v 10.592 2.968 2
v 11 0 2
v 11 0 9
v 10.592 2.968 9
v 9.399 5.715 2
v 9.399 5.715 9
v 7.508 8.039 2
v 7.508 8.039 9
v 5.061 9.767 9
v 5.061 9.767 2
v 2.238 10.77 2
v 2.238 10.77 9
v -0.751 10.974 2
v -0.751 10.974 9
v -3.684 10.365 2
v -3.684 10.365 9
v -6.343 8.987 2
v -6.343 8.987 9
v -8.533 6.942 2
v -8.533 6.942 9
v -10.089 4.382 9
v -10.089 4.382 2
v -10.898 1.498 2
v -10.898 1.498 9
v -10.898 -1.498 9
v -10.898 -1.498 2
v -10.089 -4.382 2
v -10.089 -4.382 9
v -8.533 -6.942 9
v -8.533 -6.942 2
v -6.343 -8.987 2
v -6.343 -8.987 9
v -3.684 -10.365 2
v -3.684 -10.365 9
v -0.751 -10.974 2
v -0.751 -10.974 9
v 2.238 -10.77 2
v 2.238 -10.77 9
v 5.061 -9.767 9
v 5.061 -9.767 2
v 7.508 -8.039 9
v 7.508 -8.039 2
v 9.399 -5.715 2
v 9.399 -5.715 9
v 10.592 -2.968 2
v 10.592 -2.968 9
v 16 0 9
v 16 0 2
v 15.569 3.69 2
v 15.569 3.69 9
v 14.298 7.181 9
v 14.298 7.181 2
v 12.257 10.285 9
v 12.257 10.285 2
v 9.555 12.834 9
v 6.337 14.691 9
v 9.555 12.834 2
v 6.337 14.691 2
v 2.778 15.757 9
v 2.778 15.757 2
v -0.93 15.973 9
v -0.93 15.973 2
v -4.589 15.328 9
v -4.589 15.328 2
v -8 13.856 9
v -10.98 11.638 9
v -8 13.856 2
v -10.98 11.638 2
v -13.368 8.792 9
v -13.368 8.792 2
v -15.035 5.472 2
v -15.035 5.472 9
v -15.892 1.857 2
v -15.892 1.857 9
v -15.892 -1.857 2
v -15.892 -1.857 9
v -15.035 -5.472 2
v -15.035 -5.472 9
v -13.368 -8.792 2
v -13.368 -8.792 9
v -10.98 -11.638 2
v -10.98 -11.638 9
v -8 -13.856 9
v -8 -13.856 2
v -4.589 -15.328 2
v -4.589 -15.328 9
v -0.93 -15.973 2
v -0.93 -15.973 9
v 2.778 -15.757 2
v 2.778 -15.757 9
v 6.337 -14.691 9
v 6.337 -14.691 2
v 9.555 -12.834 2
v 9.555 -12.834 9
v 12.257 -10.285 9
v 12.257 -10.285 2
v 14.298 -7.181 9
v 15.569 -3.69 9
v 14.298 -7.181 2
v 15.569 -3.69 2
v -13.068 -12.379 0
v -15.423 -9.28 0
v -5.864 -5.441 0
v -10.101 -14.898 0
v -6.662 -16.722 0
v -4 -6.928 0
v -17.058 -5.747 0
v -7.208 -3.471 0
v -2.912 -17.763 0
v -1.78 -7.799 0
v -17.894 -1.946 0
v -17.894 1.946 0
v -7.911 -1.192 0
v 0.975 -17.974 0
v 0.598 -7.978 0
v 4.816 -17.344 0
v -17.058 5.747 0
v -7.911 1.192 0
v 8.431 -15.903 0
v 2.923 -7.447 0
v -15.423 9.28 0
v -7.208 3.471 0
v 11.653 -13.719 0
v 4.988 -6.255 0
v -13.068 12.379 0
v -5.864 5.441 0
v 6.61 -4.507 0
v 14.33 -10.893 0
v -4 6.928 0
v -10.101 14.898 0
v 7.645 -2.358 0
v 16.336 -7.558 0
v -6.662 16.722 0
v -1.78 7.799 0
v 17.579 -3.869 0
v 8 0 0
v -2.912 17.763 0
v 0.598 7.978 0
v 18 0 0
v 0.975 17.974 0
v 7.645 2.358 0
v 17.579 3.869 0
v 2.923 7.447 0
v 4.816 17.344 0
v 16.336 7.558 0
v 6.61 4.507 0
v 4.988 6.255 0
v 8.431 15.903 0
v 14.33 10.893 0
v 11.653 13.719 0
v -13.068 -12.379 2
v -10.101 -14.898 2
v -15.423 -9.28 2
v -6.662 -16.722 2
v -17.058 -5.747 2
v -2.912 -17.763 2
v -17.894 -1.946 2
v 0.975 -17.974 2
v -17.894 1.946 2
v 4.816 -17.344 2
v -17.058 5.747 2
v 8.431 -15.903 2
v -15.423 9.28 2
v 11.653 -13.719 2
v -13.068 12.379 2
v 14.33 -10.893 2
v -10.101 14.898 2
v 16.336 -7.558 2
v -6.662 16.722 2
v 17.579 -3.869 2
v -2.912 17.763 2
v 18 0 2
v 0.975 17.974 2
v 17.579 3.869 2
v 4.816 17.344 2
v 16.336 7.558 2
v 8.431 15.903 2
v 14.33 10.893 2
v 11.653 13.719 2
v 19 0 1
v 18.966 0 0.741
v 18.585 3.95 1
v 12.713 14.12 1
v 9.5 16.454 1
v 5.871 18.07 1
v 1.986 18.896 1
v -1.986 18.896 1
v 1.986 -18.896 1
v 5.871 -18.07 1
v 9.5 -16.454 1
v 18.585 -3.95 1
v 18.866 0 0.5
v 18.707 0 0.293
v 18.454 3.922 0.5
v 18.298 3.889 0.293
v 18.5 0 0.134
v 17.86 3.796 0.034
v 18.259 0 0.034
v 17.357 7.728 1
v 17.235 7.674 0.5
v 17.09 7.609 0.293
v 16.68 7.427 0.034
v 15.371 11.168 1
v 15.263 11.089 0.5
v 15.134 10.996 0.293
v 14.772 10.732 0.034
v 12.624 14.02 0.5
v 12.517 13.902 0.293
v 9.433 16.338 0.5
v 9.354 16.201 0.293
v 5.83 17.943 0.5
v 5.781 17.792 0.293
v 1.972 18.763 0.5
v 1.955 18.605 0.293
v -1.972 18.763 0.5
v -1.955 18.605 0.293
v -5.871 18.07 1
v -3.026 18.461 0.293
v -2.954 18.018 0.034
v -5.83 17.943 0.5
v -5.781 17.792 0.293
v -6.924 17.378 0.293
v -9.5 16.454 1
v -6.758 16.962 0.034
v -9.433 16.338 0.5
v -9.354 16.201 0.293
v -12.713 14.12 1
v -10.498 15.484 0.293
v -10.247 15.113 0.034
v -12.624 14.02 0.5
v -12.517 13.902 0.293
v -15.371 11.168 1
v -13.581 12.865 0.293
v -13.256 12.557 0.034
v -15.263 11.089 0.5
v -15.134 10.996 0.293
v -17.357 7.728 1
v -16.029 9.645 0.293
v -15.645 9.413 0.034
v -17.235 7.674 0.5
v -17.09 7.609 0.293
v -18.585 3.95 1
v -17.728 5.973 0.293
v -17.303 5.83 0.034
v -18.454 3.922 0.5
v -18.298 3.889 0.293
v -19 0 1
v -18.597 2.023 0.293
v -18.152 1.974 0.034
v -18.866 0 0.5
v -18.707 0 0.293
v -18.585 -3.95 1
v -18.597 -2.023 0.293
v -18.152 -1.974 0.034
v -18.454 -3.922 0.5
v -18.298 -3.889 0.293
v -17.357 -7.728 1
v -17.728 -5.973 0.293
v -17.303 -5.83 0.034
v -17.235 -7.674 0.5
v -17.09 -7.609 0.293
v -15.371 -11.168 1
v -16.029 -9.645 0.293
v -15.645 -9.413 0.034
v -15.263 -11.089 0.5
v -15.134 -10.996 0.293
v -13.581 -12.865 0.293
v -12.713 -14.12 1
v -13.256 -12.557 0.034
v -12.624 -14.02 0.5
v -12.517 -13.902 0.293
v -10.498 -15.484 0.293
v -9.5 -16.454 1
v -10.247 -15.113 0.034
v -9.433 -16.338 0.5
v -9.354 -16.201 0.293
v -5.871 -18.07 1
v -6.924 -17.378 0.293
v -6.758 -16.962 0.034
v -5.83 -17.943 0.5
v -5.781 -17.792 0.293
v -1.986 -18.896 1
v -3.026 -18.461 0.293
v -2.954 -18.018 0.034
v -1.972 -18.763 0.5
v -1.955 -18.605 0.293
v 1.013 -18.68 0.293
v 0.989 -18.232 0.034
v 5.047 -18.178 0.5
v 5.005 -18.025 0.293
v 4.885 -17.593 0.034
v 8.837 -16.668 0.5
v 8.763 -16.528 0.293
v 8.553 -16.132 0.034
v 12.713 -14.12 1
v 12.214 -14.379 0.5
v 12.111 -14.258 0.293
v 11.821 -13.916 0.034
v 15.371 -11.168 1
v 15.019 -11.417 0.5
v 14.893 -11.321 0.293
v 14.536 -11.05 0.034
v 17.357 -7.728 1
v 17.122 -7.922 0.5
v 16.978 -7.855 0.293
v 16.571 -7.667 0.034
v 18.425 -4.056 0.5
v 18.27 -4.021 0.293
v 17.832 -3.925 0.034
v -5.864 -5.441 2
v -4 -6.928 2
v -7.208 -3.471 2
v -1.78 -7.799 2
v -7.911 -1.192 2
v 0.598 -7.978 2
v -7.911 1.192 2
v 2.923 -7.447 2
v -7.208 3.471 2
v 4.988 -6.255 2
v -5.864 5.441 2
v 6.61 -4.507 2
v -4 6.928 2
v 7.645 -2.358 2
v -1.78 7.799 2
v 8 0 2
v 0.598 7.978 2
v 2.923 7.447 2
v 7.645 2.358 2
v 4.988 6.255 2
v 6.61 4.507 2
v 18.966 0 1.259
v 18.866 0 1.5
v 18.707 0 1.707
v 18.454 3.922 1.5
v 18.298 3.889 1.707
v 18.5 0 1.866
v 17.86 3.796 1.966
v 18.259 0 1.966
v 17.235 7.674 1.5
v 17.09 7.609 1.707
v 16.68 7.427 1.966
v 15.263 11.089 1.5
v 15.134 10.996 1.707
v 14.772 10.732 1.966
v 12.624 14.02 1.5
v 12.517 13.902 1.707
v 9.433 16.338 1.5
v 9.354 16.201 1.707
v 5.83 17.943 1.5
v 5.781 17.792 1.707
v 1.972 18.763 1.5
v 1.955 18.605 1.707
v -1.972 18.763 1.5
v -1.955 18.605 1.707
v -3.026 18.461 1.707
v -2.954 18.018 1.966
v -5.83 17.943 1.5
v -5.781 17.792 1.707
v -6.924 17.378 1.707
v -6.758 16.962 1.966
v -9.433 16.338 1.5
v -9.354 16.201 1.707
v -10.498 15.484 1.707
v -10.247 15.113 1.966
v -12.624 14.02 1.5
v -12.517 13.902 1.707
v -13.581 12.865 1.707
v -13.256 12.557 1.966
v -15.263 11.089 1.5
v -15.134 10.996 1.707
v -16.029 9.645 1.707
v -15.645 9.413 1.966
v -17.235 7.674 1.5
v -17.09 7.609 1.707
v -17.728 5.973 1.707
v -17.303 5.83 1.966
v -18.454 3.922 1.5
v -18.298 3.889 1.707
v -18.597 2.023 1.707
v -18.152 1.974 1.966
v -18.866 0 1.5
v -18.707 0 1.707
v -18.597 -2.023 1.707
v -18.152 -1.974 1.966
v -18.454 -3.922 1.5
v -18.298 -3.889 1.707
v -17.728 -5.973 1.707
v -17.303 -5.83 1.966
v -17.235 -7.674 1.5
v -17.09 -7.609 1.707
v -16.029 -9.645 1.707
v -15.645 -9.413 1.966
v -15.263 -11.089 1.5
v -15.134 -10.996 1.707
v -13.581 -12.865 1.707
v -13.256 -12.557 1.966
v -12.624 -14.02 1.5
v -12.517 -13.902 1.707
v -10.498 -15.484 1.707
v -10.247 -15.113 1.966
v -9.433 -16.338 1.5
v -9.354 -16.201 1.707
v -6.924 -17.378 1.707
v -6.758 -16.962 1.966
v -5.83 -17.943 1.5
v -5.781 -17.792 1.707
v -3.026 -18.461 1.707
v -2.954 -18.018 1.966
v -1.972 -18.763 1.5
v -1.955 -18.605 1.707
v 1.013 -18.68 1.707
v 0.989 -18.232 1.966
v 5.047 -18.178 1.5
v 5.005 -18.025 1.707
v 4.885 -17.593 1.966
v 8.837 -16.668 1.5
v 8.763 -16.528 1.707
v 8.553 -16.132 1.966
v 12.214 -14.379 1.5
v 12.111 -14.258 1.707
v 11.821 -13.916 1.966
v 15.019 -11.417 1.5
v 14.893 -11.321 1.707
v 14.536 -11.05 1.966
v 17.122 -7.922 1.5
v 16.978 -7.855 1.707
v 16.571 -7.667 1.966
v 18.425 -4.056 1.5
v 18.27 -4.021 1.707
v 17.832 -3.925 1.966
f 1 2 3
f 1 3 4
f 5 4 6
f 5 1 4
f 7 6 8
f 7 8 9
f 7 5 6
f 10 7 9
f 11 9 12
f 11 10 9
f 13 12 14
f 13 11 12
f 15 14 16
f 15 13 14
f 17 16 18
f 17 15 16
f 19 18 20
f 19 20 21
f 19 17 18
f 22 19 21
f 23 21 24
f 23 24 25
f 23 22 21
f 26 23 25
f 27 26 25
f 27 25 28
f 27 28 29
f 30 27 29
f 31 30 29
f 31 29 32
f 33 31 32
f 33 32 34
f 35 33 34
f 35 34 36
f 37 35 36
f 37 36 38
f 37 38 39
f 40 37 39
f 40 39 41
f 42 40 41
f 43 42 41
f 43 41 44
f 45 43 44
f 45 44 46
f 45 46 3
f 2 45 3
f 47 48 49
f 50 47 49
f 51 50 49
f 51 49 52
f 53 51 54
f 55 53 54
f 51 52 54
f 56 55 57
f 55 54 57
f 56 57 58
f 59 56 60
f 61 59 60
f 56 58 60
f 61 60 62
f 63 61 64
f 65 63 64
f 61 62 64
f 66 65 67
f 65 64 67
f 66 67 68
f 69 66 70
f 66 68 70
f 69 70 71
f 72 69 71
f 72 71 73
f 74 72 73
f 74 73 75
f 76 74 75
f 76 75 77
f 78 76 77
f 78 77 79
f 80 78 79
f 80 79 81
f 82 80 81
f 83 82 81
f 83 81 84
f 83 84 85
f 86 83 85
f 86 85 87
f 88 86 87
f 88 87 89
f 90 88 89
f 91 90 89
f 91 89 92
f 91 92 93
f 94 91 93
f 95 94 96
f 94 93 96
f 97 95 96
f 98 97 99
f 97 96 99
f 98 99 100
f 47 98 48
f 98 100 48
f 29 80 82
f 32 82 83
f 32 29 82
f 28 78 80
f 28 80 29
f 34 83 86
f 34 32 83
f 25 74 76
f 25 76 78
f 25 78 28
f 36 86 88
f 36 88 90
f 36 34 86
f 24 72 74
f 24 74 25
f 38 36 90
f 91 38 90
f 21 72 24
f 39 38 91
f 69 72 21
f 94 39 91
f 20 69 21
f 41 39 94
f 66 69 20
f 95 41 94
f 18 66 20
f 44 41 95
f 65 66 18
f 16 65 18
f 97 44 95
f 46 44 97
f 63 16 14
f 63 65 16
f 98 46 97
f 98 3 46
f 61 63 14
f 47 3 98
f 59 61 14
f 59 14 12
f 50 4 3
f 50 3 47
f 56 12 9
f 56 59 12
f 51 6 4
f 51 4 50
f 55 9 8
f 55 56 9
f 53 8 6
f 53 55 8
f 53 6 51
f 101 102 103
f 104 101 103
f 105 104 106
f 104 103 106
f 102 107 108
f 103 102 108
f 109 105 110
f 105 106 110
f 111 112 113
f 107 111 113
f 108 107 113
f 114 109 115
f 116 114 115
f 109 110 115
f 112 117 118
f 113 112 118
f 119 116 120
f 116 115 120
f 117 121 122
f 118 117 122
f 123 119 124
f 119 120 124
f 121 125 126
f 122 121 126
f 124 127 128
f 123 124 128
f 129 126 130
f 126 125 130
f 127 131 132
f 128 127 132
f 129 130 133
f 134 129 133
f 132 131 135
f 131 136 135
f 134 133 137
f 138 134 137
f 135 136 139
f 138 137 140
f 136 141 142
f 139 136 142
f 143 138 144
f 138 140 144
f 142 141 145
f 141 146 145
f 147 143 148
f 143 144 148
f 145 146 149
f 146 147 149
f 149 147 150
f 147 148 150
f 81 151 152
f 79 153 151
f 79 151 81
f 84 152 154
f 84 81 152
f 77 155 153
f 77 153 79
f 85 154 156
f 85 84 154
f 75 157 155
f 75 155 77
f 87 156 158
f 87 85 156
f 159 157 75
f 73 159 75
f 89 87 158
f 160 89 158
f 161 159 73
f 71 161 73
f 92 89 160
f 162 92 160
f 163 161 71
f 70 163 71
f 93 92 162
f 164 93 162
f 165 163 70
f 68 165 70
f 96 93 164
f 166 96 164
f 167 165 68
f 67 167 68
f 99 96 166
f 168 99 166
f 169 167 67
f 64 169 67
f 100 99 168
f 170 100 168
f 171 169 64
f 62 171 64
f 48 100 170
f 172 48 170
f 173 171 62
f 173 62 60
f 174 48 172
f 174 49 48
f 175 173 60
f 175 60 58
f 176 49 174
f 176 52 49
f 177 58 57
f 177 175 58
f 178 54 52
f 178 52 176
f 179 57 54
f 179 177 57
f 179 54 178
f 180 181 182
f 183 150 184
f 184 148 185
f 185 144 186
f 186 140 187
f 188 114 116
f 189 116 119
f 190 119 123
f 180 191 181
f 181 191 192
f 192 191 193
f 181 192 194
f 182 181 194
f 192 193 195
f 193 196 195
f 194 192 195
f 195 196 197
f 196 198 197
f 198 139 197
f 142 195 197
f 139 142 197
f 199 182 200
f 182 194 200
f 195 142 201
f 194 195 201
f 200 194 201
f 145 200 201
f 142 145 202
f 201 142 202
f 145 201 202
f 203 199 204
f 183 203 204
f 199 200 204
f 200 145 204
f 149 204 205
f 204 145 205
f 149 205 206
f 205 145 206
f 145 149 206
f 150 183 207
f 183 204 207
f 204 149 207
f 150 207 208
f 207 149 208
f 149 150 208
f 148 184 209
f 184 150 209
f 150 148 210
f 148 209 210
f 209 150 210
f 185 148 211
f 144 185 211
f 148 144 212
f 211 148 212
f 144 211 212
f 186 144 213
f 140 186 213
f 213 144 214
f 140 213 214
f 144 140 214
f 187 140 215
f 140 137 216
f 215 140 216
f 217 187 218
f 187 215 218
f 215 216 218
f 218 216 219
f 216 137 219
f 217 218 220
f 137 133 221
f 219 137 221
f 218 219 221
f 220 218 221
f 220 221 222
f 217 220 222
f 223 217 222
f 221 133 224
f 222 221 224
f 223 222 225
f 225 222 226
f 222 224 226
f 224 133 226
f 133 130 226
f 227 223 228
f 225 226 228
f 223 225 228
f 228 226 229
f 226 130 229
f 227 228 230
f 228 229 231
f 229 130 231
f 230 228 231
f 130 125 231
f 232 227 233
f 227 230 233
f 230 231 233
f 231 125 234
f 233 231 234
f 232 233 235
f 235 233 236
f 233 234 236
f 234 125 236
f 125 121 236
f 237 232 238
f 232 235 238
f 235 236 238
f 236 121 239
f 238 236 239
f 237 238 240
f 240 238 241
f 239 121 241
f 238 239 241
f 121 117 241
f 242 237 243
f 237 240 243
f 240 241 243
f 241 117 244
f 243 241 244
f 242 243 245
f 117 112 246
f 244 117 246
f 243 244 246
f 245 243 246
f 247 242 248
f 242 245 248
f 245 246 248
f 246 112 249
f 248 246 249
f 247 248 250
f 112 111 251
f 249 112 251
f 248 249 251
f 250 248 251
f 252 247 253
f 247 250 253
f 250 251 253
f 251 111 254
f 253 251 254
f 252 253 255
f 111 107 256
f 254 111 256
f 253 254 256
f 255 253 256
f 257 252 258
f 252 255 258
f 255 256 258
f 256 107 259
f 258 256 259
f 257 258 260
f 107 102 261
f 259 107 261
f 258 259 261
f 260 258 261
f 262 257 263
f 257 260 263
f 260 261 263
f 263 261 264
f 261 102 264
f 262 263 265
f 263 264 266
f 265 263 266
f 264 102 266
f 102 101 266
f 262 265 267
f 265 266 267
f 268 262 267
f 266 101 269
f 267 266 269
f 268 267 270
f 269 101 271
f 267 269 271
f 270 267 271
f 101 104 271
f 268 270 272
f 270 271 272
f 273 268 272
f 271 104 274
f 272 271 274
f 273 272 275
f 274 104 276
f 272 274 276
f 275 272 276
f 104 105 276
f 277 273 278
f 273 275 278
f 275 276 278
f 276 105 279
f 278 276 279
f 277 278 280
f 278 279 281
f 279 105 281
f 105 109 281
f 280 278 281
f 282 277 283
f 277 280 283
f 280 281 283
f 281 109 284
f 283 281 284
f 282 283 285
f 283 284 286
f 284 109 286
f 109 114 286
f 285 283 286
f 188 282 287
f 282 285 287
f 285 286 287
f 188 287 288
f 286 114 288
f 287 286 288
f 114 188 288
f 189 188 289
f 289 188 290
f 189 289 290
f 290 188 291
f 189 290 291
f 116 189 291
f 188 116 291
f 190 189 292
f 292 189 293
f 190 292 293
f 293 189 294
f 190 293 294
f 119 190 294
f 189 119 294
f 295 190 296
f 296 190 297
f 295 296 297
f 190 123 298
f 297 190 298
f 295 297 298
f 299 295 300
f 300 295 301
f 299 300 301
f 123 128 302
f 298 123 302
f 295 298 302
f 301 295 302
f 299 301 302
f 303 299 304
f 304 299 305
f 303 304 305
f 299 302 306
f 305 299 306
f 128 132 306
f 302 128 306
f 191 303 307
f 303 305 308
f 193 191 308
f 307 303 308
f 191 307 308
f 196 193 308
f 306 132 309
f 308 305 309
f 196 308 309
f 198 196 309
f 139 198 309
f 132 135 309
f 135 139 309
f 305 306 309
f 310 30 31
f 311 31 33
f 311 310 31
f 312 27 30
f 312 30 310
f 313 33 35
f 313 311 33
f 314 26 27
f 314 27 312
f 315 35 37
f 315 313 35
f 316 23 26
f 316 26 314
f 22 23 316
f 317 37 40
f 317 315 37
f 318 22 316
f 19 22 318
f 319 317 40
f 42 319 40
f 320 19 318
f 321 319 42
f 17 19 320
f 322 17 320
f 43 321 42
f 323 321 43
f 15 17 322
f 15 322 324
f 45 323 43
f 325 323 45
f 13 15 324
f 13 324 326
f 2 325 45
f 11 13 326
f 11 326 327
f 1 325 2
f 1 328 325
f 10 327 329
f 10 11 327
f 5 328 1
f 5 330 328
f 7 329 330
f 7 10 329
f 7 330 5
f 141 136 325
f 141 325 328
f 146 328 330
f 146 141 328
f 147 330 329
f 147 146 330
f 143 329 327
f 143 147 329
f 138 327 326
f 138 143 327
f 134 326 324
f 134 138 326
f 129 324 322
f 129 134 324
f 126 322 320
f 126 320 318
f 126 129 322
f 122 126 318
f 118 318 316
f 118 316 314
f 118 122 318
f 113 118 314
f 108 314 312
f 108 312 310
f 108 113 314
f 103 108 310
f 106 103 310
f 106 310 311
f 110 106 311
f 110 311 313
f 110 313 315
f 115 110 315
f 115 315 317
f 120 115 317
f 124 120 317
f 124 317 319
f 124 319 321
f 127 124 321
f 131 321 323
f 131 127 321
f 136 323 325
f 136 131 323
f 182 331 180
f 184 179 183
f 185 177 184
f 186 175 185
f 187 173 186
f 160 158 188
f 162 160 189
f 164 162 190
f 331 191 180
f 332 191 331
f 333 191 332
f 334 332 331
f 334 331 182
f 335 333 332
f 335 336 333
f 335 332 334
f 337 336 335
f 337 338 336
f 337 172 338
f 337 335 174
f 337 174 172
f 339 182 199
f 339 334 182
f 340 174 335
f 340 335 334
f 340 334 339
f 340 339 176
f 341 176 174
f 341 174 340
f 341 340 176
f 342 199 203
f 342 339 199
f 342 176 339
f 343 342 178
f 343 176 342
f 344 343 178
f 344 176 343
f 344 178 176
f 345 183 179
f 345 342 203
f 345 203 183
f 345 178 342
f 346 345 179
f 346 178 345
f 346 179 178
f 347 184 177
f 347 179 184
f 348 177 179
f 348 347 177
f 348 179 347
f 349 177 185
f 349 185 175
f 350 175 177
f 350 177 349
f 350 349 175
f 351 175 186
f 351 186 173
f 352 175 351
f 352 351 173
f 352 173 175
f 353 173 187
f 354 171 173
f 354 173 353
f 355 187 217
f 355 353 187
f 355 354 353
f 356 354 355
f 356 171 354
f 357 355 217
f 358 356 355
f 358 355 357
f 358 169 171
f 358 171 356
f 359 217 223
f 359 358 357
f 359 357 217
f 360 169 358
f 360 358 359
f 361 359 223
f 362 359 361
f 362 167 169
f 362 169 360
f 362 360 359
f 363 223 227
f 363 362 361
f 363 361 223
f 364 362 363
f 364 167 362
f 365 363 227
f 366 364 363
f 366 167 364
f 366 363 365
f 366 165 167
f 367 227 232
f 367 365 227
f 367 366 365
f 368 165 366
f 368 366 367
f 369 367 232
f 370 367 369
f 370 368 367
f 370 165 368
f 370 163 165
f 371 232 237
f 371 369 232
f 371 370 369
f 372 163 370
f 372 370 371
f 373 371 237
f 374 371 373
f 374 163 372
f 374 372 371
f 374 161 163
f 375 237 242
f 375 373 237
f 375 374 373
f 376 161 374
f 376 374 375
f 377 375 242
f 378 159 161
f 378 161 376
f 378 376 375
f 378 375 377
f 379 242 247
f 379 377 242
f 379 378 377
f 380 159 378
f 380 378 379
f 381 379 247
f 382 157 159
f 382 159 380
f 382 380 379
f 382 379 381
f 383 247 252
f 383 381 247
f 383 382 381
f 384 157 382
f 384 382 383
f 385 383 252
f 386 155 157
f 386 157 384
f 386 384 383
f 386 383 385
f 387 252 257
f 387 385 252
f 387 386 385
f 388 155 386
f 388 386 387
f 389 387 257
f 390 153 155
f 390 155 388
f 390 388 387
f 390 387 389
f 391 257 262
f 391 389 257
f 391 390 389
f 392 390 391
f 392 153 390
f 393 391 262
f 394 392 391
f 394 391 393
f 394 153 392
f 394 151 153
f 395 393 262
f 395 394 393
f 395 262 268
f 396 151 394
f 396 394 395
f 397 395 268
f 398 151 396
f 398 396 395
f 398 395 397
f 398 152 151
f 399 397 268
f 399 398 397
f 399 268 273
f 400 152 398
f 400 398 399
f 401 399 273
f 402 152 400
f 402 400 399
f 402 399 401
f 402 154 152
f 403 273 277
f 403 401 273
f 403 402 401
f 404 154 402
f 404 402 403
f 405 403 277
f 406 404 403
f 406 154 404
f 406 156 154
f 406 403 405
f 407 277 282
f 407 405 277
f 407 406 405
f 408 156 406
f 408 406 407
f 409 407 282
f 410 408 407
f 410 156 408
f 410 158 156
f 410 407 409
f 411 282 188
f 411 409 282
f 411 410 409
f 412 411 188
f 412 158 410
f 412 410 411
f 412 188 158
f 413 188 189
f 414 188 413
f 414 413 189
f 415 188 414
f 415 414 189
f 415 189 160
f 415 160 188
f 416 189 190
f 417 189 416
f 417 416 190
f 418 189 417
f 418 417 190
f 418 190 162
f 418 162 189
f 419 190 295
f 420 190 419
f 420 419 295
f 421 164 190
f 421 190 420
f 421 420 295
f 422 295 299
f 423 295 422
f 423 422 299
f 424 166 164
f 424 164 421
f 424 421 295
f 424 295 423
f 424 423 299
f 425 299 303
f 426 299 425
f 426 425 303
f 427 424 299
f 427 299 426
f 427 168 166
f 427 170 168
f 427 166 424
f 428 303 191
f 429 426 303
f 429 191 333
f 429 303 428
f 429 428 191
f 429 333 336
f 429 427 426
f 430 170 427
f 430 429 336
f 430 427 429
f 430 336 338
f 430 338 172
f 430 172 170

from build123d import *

# Parameters (mm, degrees)
F0_R     = 19
F0_R_2   = 16
F0_R_3   = 11
F1_DEPTH = 2
F2_DEPTH = 9
F3_R     = 1
F4_R     = 0.99999
F0_R_4   = 8
F5_DEPTH = 2


# Not quite as in the source:
# - a fillet or chamfer is up to 0.001 mm smaller than in the source, because OpenCascade refuses the exact size


with BuildPart() as f1:
    # F0 (on Top) → F1 (new body)
    with BuildSketch(Plane.XY):
        Circle(F0_R)
        Circle(F0_R_2, mode=Mode.SUBTRACT)
        Circle(F0_R_2)
        Circle(F0_R_3, mode=Mode.SUBTRACT)
    extrude(amount=F1_DEPTH)

    # F0 (on Top) → F2 (join)
    with BuildSketch(Plane.XY):
        Circle(F0_R_2)
        Circle(F0_R_3, mode=Mode.SUBTRACT)
    extrude(amount=F2_DEPTH)

    # F3
    f3_edges = [f1.edges().sort_by_distance(p)[0] for p in [
        (-19, 0, 2),
    ]]
    fillet(f3_edges, radius=F3_R)

    # F4 (radius 1 in the source; OpenCascade refuses exactly that, so slightly less here)
    f4_edges = [f1.edges().sort_by_distance(p)[0] for p in [
        (-19, 0, 0),
    ]]
    fillet(f4_edges, radius=F4_R)

    # F0 (on Top) → F5 (join)
    with BuildSketch(Plane.XY):
        Circle(F0_R_3)
        Circle(F0_R_4, mode=Mode.SUBTRACT)
    extrude(amount=F5_DEPTH)


solid = f1.part
